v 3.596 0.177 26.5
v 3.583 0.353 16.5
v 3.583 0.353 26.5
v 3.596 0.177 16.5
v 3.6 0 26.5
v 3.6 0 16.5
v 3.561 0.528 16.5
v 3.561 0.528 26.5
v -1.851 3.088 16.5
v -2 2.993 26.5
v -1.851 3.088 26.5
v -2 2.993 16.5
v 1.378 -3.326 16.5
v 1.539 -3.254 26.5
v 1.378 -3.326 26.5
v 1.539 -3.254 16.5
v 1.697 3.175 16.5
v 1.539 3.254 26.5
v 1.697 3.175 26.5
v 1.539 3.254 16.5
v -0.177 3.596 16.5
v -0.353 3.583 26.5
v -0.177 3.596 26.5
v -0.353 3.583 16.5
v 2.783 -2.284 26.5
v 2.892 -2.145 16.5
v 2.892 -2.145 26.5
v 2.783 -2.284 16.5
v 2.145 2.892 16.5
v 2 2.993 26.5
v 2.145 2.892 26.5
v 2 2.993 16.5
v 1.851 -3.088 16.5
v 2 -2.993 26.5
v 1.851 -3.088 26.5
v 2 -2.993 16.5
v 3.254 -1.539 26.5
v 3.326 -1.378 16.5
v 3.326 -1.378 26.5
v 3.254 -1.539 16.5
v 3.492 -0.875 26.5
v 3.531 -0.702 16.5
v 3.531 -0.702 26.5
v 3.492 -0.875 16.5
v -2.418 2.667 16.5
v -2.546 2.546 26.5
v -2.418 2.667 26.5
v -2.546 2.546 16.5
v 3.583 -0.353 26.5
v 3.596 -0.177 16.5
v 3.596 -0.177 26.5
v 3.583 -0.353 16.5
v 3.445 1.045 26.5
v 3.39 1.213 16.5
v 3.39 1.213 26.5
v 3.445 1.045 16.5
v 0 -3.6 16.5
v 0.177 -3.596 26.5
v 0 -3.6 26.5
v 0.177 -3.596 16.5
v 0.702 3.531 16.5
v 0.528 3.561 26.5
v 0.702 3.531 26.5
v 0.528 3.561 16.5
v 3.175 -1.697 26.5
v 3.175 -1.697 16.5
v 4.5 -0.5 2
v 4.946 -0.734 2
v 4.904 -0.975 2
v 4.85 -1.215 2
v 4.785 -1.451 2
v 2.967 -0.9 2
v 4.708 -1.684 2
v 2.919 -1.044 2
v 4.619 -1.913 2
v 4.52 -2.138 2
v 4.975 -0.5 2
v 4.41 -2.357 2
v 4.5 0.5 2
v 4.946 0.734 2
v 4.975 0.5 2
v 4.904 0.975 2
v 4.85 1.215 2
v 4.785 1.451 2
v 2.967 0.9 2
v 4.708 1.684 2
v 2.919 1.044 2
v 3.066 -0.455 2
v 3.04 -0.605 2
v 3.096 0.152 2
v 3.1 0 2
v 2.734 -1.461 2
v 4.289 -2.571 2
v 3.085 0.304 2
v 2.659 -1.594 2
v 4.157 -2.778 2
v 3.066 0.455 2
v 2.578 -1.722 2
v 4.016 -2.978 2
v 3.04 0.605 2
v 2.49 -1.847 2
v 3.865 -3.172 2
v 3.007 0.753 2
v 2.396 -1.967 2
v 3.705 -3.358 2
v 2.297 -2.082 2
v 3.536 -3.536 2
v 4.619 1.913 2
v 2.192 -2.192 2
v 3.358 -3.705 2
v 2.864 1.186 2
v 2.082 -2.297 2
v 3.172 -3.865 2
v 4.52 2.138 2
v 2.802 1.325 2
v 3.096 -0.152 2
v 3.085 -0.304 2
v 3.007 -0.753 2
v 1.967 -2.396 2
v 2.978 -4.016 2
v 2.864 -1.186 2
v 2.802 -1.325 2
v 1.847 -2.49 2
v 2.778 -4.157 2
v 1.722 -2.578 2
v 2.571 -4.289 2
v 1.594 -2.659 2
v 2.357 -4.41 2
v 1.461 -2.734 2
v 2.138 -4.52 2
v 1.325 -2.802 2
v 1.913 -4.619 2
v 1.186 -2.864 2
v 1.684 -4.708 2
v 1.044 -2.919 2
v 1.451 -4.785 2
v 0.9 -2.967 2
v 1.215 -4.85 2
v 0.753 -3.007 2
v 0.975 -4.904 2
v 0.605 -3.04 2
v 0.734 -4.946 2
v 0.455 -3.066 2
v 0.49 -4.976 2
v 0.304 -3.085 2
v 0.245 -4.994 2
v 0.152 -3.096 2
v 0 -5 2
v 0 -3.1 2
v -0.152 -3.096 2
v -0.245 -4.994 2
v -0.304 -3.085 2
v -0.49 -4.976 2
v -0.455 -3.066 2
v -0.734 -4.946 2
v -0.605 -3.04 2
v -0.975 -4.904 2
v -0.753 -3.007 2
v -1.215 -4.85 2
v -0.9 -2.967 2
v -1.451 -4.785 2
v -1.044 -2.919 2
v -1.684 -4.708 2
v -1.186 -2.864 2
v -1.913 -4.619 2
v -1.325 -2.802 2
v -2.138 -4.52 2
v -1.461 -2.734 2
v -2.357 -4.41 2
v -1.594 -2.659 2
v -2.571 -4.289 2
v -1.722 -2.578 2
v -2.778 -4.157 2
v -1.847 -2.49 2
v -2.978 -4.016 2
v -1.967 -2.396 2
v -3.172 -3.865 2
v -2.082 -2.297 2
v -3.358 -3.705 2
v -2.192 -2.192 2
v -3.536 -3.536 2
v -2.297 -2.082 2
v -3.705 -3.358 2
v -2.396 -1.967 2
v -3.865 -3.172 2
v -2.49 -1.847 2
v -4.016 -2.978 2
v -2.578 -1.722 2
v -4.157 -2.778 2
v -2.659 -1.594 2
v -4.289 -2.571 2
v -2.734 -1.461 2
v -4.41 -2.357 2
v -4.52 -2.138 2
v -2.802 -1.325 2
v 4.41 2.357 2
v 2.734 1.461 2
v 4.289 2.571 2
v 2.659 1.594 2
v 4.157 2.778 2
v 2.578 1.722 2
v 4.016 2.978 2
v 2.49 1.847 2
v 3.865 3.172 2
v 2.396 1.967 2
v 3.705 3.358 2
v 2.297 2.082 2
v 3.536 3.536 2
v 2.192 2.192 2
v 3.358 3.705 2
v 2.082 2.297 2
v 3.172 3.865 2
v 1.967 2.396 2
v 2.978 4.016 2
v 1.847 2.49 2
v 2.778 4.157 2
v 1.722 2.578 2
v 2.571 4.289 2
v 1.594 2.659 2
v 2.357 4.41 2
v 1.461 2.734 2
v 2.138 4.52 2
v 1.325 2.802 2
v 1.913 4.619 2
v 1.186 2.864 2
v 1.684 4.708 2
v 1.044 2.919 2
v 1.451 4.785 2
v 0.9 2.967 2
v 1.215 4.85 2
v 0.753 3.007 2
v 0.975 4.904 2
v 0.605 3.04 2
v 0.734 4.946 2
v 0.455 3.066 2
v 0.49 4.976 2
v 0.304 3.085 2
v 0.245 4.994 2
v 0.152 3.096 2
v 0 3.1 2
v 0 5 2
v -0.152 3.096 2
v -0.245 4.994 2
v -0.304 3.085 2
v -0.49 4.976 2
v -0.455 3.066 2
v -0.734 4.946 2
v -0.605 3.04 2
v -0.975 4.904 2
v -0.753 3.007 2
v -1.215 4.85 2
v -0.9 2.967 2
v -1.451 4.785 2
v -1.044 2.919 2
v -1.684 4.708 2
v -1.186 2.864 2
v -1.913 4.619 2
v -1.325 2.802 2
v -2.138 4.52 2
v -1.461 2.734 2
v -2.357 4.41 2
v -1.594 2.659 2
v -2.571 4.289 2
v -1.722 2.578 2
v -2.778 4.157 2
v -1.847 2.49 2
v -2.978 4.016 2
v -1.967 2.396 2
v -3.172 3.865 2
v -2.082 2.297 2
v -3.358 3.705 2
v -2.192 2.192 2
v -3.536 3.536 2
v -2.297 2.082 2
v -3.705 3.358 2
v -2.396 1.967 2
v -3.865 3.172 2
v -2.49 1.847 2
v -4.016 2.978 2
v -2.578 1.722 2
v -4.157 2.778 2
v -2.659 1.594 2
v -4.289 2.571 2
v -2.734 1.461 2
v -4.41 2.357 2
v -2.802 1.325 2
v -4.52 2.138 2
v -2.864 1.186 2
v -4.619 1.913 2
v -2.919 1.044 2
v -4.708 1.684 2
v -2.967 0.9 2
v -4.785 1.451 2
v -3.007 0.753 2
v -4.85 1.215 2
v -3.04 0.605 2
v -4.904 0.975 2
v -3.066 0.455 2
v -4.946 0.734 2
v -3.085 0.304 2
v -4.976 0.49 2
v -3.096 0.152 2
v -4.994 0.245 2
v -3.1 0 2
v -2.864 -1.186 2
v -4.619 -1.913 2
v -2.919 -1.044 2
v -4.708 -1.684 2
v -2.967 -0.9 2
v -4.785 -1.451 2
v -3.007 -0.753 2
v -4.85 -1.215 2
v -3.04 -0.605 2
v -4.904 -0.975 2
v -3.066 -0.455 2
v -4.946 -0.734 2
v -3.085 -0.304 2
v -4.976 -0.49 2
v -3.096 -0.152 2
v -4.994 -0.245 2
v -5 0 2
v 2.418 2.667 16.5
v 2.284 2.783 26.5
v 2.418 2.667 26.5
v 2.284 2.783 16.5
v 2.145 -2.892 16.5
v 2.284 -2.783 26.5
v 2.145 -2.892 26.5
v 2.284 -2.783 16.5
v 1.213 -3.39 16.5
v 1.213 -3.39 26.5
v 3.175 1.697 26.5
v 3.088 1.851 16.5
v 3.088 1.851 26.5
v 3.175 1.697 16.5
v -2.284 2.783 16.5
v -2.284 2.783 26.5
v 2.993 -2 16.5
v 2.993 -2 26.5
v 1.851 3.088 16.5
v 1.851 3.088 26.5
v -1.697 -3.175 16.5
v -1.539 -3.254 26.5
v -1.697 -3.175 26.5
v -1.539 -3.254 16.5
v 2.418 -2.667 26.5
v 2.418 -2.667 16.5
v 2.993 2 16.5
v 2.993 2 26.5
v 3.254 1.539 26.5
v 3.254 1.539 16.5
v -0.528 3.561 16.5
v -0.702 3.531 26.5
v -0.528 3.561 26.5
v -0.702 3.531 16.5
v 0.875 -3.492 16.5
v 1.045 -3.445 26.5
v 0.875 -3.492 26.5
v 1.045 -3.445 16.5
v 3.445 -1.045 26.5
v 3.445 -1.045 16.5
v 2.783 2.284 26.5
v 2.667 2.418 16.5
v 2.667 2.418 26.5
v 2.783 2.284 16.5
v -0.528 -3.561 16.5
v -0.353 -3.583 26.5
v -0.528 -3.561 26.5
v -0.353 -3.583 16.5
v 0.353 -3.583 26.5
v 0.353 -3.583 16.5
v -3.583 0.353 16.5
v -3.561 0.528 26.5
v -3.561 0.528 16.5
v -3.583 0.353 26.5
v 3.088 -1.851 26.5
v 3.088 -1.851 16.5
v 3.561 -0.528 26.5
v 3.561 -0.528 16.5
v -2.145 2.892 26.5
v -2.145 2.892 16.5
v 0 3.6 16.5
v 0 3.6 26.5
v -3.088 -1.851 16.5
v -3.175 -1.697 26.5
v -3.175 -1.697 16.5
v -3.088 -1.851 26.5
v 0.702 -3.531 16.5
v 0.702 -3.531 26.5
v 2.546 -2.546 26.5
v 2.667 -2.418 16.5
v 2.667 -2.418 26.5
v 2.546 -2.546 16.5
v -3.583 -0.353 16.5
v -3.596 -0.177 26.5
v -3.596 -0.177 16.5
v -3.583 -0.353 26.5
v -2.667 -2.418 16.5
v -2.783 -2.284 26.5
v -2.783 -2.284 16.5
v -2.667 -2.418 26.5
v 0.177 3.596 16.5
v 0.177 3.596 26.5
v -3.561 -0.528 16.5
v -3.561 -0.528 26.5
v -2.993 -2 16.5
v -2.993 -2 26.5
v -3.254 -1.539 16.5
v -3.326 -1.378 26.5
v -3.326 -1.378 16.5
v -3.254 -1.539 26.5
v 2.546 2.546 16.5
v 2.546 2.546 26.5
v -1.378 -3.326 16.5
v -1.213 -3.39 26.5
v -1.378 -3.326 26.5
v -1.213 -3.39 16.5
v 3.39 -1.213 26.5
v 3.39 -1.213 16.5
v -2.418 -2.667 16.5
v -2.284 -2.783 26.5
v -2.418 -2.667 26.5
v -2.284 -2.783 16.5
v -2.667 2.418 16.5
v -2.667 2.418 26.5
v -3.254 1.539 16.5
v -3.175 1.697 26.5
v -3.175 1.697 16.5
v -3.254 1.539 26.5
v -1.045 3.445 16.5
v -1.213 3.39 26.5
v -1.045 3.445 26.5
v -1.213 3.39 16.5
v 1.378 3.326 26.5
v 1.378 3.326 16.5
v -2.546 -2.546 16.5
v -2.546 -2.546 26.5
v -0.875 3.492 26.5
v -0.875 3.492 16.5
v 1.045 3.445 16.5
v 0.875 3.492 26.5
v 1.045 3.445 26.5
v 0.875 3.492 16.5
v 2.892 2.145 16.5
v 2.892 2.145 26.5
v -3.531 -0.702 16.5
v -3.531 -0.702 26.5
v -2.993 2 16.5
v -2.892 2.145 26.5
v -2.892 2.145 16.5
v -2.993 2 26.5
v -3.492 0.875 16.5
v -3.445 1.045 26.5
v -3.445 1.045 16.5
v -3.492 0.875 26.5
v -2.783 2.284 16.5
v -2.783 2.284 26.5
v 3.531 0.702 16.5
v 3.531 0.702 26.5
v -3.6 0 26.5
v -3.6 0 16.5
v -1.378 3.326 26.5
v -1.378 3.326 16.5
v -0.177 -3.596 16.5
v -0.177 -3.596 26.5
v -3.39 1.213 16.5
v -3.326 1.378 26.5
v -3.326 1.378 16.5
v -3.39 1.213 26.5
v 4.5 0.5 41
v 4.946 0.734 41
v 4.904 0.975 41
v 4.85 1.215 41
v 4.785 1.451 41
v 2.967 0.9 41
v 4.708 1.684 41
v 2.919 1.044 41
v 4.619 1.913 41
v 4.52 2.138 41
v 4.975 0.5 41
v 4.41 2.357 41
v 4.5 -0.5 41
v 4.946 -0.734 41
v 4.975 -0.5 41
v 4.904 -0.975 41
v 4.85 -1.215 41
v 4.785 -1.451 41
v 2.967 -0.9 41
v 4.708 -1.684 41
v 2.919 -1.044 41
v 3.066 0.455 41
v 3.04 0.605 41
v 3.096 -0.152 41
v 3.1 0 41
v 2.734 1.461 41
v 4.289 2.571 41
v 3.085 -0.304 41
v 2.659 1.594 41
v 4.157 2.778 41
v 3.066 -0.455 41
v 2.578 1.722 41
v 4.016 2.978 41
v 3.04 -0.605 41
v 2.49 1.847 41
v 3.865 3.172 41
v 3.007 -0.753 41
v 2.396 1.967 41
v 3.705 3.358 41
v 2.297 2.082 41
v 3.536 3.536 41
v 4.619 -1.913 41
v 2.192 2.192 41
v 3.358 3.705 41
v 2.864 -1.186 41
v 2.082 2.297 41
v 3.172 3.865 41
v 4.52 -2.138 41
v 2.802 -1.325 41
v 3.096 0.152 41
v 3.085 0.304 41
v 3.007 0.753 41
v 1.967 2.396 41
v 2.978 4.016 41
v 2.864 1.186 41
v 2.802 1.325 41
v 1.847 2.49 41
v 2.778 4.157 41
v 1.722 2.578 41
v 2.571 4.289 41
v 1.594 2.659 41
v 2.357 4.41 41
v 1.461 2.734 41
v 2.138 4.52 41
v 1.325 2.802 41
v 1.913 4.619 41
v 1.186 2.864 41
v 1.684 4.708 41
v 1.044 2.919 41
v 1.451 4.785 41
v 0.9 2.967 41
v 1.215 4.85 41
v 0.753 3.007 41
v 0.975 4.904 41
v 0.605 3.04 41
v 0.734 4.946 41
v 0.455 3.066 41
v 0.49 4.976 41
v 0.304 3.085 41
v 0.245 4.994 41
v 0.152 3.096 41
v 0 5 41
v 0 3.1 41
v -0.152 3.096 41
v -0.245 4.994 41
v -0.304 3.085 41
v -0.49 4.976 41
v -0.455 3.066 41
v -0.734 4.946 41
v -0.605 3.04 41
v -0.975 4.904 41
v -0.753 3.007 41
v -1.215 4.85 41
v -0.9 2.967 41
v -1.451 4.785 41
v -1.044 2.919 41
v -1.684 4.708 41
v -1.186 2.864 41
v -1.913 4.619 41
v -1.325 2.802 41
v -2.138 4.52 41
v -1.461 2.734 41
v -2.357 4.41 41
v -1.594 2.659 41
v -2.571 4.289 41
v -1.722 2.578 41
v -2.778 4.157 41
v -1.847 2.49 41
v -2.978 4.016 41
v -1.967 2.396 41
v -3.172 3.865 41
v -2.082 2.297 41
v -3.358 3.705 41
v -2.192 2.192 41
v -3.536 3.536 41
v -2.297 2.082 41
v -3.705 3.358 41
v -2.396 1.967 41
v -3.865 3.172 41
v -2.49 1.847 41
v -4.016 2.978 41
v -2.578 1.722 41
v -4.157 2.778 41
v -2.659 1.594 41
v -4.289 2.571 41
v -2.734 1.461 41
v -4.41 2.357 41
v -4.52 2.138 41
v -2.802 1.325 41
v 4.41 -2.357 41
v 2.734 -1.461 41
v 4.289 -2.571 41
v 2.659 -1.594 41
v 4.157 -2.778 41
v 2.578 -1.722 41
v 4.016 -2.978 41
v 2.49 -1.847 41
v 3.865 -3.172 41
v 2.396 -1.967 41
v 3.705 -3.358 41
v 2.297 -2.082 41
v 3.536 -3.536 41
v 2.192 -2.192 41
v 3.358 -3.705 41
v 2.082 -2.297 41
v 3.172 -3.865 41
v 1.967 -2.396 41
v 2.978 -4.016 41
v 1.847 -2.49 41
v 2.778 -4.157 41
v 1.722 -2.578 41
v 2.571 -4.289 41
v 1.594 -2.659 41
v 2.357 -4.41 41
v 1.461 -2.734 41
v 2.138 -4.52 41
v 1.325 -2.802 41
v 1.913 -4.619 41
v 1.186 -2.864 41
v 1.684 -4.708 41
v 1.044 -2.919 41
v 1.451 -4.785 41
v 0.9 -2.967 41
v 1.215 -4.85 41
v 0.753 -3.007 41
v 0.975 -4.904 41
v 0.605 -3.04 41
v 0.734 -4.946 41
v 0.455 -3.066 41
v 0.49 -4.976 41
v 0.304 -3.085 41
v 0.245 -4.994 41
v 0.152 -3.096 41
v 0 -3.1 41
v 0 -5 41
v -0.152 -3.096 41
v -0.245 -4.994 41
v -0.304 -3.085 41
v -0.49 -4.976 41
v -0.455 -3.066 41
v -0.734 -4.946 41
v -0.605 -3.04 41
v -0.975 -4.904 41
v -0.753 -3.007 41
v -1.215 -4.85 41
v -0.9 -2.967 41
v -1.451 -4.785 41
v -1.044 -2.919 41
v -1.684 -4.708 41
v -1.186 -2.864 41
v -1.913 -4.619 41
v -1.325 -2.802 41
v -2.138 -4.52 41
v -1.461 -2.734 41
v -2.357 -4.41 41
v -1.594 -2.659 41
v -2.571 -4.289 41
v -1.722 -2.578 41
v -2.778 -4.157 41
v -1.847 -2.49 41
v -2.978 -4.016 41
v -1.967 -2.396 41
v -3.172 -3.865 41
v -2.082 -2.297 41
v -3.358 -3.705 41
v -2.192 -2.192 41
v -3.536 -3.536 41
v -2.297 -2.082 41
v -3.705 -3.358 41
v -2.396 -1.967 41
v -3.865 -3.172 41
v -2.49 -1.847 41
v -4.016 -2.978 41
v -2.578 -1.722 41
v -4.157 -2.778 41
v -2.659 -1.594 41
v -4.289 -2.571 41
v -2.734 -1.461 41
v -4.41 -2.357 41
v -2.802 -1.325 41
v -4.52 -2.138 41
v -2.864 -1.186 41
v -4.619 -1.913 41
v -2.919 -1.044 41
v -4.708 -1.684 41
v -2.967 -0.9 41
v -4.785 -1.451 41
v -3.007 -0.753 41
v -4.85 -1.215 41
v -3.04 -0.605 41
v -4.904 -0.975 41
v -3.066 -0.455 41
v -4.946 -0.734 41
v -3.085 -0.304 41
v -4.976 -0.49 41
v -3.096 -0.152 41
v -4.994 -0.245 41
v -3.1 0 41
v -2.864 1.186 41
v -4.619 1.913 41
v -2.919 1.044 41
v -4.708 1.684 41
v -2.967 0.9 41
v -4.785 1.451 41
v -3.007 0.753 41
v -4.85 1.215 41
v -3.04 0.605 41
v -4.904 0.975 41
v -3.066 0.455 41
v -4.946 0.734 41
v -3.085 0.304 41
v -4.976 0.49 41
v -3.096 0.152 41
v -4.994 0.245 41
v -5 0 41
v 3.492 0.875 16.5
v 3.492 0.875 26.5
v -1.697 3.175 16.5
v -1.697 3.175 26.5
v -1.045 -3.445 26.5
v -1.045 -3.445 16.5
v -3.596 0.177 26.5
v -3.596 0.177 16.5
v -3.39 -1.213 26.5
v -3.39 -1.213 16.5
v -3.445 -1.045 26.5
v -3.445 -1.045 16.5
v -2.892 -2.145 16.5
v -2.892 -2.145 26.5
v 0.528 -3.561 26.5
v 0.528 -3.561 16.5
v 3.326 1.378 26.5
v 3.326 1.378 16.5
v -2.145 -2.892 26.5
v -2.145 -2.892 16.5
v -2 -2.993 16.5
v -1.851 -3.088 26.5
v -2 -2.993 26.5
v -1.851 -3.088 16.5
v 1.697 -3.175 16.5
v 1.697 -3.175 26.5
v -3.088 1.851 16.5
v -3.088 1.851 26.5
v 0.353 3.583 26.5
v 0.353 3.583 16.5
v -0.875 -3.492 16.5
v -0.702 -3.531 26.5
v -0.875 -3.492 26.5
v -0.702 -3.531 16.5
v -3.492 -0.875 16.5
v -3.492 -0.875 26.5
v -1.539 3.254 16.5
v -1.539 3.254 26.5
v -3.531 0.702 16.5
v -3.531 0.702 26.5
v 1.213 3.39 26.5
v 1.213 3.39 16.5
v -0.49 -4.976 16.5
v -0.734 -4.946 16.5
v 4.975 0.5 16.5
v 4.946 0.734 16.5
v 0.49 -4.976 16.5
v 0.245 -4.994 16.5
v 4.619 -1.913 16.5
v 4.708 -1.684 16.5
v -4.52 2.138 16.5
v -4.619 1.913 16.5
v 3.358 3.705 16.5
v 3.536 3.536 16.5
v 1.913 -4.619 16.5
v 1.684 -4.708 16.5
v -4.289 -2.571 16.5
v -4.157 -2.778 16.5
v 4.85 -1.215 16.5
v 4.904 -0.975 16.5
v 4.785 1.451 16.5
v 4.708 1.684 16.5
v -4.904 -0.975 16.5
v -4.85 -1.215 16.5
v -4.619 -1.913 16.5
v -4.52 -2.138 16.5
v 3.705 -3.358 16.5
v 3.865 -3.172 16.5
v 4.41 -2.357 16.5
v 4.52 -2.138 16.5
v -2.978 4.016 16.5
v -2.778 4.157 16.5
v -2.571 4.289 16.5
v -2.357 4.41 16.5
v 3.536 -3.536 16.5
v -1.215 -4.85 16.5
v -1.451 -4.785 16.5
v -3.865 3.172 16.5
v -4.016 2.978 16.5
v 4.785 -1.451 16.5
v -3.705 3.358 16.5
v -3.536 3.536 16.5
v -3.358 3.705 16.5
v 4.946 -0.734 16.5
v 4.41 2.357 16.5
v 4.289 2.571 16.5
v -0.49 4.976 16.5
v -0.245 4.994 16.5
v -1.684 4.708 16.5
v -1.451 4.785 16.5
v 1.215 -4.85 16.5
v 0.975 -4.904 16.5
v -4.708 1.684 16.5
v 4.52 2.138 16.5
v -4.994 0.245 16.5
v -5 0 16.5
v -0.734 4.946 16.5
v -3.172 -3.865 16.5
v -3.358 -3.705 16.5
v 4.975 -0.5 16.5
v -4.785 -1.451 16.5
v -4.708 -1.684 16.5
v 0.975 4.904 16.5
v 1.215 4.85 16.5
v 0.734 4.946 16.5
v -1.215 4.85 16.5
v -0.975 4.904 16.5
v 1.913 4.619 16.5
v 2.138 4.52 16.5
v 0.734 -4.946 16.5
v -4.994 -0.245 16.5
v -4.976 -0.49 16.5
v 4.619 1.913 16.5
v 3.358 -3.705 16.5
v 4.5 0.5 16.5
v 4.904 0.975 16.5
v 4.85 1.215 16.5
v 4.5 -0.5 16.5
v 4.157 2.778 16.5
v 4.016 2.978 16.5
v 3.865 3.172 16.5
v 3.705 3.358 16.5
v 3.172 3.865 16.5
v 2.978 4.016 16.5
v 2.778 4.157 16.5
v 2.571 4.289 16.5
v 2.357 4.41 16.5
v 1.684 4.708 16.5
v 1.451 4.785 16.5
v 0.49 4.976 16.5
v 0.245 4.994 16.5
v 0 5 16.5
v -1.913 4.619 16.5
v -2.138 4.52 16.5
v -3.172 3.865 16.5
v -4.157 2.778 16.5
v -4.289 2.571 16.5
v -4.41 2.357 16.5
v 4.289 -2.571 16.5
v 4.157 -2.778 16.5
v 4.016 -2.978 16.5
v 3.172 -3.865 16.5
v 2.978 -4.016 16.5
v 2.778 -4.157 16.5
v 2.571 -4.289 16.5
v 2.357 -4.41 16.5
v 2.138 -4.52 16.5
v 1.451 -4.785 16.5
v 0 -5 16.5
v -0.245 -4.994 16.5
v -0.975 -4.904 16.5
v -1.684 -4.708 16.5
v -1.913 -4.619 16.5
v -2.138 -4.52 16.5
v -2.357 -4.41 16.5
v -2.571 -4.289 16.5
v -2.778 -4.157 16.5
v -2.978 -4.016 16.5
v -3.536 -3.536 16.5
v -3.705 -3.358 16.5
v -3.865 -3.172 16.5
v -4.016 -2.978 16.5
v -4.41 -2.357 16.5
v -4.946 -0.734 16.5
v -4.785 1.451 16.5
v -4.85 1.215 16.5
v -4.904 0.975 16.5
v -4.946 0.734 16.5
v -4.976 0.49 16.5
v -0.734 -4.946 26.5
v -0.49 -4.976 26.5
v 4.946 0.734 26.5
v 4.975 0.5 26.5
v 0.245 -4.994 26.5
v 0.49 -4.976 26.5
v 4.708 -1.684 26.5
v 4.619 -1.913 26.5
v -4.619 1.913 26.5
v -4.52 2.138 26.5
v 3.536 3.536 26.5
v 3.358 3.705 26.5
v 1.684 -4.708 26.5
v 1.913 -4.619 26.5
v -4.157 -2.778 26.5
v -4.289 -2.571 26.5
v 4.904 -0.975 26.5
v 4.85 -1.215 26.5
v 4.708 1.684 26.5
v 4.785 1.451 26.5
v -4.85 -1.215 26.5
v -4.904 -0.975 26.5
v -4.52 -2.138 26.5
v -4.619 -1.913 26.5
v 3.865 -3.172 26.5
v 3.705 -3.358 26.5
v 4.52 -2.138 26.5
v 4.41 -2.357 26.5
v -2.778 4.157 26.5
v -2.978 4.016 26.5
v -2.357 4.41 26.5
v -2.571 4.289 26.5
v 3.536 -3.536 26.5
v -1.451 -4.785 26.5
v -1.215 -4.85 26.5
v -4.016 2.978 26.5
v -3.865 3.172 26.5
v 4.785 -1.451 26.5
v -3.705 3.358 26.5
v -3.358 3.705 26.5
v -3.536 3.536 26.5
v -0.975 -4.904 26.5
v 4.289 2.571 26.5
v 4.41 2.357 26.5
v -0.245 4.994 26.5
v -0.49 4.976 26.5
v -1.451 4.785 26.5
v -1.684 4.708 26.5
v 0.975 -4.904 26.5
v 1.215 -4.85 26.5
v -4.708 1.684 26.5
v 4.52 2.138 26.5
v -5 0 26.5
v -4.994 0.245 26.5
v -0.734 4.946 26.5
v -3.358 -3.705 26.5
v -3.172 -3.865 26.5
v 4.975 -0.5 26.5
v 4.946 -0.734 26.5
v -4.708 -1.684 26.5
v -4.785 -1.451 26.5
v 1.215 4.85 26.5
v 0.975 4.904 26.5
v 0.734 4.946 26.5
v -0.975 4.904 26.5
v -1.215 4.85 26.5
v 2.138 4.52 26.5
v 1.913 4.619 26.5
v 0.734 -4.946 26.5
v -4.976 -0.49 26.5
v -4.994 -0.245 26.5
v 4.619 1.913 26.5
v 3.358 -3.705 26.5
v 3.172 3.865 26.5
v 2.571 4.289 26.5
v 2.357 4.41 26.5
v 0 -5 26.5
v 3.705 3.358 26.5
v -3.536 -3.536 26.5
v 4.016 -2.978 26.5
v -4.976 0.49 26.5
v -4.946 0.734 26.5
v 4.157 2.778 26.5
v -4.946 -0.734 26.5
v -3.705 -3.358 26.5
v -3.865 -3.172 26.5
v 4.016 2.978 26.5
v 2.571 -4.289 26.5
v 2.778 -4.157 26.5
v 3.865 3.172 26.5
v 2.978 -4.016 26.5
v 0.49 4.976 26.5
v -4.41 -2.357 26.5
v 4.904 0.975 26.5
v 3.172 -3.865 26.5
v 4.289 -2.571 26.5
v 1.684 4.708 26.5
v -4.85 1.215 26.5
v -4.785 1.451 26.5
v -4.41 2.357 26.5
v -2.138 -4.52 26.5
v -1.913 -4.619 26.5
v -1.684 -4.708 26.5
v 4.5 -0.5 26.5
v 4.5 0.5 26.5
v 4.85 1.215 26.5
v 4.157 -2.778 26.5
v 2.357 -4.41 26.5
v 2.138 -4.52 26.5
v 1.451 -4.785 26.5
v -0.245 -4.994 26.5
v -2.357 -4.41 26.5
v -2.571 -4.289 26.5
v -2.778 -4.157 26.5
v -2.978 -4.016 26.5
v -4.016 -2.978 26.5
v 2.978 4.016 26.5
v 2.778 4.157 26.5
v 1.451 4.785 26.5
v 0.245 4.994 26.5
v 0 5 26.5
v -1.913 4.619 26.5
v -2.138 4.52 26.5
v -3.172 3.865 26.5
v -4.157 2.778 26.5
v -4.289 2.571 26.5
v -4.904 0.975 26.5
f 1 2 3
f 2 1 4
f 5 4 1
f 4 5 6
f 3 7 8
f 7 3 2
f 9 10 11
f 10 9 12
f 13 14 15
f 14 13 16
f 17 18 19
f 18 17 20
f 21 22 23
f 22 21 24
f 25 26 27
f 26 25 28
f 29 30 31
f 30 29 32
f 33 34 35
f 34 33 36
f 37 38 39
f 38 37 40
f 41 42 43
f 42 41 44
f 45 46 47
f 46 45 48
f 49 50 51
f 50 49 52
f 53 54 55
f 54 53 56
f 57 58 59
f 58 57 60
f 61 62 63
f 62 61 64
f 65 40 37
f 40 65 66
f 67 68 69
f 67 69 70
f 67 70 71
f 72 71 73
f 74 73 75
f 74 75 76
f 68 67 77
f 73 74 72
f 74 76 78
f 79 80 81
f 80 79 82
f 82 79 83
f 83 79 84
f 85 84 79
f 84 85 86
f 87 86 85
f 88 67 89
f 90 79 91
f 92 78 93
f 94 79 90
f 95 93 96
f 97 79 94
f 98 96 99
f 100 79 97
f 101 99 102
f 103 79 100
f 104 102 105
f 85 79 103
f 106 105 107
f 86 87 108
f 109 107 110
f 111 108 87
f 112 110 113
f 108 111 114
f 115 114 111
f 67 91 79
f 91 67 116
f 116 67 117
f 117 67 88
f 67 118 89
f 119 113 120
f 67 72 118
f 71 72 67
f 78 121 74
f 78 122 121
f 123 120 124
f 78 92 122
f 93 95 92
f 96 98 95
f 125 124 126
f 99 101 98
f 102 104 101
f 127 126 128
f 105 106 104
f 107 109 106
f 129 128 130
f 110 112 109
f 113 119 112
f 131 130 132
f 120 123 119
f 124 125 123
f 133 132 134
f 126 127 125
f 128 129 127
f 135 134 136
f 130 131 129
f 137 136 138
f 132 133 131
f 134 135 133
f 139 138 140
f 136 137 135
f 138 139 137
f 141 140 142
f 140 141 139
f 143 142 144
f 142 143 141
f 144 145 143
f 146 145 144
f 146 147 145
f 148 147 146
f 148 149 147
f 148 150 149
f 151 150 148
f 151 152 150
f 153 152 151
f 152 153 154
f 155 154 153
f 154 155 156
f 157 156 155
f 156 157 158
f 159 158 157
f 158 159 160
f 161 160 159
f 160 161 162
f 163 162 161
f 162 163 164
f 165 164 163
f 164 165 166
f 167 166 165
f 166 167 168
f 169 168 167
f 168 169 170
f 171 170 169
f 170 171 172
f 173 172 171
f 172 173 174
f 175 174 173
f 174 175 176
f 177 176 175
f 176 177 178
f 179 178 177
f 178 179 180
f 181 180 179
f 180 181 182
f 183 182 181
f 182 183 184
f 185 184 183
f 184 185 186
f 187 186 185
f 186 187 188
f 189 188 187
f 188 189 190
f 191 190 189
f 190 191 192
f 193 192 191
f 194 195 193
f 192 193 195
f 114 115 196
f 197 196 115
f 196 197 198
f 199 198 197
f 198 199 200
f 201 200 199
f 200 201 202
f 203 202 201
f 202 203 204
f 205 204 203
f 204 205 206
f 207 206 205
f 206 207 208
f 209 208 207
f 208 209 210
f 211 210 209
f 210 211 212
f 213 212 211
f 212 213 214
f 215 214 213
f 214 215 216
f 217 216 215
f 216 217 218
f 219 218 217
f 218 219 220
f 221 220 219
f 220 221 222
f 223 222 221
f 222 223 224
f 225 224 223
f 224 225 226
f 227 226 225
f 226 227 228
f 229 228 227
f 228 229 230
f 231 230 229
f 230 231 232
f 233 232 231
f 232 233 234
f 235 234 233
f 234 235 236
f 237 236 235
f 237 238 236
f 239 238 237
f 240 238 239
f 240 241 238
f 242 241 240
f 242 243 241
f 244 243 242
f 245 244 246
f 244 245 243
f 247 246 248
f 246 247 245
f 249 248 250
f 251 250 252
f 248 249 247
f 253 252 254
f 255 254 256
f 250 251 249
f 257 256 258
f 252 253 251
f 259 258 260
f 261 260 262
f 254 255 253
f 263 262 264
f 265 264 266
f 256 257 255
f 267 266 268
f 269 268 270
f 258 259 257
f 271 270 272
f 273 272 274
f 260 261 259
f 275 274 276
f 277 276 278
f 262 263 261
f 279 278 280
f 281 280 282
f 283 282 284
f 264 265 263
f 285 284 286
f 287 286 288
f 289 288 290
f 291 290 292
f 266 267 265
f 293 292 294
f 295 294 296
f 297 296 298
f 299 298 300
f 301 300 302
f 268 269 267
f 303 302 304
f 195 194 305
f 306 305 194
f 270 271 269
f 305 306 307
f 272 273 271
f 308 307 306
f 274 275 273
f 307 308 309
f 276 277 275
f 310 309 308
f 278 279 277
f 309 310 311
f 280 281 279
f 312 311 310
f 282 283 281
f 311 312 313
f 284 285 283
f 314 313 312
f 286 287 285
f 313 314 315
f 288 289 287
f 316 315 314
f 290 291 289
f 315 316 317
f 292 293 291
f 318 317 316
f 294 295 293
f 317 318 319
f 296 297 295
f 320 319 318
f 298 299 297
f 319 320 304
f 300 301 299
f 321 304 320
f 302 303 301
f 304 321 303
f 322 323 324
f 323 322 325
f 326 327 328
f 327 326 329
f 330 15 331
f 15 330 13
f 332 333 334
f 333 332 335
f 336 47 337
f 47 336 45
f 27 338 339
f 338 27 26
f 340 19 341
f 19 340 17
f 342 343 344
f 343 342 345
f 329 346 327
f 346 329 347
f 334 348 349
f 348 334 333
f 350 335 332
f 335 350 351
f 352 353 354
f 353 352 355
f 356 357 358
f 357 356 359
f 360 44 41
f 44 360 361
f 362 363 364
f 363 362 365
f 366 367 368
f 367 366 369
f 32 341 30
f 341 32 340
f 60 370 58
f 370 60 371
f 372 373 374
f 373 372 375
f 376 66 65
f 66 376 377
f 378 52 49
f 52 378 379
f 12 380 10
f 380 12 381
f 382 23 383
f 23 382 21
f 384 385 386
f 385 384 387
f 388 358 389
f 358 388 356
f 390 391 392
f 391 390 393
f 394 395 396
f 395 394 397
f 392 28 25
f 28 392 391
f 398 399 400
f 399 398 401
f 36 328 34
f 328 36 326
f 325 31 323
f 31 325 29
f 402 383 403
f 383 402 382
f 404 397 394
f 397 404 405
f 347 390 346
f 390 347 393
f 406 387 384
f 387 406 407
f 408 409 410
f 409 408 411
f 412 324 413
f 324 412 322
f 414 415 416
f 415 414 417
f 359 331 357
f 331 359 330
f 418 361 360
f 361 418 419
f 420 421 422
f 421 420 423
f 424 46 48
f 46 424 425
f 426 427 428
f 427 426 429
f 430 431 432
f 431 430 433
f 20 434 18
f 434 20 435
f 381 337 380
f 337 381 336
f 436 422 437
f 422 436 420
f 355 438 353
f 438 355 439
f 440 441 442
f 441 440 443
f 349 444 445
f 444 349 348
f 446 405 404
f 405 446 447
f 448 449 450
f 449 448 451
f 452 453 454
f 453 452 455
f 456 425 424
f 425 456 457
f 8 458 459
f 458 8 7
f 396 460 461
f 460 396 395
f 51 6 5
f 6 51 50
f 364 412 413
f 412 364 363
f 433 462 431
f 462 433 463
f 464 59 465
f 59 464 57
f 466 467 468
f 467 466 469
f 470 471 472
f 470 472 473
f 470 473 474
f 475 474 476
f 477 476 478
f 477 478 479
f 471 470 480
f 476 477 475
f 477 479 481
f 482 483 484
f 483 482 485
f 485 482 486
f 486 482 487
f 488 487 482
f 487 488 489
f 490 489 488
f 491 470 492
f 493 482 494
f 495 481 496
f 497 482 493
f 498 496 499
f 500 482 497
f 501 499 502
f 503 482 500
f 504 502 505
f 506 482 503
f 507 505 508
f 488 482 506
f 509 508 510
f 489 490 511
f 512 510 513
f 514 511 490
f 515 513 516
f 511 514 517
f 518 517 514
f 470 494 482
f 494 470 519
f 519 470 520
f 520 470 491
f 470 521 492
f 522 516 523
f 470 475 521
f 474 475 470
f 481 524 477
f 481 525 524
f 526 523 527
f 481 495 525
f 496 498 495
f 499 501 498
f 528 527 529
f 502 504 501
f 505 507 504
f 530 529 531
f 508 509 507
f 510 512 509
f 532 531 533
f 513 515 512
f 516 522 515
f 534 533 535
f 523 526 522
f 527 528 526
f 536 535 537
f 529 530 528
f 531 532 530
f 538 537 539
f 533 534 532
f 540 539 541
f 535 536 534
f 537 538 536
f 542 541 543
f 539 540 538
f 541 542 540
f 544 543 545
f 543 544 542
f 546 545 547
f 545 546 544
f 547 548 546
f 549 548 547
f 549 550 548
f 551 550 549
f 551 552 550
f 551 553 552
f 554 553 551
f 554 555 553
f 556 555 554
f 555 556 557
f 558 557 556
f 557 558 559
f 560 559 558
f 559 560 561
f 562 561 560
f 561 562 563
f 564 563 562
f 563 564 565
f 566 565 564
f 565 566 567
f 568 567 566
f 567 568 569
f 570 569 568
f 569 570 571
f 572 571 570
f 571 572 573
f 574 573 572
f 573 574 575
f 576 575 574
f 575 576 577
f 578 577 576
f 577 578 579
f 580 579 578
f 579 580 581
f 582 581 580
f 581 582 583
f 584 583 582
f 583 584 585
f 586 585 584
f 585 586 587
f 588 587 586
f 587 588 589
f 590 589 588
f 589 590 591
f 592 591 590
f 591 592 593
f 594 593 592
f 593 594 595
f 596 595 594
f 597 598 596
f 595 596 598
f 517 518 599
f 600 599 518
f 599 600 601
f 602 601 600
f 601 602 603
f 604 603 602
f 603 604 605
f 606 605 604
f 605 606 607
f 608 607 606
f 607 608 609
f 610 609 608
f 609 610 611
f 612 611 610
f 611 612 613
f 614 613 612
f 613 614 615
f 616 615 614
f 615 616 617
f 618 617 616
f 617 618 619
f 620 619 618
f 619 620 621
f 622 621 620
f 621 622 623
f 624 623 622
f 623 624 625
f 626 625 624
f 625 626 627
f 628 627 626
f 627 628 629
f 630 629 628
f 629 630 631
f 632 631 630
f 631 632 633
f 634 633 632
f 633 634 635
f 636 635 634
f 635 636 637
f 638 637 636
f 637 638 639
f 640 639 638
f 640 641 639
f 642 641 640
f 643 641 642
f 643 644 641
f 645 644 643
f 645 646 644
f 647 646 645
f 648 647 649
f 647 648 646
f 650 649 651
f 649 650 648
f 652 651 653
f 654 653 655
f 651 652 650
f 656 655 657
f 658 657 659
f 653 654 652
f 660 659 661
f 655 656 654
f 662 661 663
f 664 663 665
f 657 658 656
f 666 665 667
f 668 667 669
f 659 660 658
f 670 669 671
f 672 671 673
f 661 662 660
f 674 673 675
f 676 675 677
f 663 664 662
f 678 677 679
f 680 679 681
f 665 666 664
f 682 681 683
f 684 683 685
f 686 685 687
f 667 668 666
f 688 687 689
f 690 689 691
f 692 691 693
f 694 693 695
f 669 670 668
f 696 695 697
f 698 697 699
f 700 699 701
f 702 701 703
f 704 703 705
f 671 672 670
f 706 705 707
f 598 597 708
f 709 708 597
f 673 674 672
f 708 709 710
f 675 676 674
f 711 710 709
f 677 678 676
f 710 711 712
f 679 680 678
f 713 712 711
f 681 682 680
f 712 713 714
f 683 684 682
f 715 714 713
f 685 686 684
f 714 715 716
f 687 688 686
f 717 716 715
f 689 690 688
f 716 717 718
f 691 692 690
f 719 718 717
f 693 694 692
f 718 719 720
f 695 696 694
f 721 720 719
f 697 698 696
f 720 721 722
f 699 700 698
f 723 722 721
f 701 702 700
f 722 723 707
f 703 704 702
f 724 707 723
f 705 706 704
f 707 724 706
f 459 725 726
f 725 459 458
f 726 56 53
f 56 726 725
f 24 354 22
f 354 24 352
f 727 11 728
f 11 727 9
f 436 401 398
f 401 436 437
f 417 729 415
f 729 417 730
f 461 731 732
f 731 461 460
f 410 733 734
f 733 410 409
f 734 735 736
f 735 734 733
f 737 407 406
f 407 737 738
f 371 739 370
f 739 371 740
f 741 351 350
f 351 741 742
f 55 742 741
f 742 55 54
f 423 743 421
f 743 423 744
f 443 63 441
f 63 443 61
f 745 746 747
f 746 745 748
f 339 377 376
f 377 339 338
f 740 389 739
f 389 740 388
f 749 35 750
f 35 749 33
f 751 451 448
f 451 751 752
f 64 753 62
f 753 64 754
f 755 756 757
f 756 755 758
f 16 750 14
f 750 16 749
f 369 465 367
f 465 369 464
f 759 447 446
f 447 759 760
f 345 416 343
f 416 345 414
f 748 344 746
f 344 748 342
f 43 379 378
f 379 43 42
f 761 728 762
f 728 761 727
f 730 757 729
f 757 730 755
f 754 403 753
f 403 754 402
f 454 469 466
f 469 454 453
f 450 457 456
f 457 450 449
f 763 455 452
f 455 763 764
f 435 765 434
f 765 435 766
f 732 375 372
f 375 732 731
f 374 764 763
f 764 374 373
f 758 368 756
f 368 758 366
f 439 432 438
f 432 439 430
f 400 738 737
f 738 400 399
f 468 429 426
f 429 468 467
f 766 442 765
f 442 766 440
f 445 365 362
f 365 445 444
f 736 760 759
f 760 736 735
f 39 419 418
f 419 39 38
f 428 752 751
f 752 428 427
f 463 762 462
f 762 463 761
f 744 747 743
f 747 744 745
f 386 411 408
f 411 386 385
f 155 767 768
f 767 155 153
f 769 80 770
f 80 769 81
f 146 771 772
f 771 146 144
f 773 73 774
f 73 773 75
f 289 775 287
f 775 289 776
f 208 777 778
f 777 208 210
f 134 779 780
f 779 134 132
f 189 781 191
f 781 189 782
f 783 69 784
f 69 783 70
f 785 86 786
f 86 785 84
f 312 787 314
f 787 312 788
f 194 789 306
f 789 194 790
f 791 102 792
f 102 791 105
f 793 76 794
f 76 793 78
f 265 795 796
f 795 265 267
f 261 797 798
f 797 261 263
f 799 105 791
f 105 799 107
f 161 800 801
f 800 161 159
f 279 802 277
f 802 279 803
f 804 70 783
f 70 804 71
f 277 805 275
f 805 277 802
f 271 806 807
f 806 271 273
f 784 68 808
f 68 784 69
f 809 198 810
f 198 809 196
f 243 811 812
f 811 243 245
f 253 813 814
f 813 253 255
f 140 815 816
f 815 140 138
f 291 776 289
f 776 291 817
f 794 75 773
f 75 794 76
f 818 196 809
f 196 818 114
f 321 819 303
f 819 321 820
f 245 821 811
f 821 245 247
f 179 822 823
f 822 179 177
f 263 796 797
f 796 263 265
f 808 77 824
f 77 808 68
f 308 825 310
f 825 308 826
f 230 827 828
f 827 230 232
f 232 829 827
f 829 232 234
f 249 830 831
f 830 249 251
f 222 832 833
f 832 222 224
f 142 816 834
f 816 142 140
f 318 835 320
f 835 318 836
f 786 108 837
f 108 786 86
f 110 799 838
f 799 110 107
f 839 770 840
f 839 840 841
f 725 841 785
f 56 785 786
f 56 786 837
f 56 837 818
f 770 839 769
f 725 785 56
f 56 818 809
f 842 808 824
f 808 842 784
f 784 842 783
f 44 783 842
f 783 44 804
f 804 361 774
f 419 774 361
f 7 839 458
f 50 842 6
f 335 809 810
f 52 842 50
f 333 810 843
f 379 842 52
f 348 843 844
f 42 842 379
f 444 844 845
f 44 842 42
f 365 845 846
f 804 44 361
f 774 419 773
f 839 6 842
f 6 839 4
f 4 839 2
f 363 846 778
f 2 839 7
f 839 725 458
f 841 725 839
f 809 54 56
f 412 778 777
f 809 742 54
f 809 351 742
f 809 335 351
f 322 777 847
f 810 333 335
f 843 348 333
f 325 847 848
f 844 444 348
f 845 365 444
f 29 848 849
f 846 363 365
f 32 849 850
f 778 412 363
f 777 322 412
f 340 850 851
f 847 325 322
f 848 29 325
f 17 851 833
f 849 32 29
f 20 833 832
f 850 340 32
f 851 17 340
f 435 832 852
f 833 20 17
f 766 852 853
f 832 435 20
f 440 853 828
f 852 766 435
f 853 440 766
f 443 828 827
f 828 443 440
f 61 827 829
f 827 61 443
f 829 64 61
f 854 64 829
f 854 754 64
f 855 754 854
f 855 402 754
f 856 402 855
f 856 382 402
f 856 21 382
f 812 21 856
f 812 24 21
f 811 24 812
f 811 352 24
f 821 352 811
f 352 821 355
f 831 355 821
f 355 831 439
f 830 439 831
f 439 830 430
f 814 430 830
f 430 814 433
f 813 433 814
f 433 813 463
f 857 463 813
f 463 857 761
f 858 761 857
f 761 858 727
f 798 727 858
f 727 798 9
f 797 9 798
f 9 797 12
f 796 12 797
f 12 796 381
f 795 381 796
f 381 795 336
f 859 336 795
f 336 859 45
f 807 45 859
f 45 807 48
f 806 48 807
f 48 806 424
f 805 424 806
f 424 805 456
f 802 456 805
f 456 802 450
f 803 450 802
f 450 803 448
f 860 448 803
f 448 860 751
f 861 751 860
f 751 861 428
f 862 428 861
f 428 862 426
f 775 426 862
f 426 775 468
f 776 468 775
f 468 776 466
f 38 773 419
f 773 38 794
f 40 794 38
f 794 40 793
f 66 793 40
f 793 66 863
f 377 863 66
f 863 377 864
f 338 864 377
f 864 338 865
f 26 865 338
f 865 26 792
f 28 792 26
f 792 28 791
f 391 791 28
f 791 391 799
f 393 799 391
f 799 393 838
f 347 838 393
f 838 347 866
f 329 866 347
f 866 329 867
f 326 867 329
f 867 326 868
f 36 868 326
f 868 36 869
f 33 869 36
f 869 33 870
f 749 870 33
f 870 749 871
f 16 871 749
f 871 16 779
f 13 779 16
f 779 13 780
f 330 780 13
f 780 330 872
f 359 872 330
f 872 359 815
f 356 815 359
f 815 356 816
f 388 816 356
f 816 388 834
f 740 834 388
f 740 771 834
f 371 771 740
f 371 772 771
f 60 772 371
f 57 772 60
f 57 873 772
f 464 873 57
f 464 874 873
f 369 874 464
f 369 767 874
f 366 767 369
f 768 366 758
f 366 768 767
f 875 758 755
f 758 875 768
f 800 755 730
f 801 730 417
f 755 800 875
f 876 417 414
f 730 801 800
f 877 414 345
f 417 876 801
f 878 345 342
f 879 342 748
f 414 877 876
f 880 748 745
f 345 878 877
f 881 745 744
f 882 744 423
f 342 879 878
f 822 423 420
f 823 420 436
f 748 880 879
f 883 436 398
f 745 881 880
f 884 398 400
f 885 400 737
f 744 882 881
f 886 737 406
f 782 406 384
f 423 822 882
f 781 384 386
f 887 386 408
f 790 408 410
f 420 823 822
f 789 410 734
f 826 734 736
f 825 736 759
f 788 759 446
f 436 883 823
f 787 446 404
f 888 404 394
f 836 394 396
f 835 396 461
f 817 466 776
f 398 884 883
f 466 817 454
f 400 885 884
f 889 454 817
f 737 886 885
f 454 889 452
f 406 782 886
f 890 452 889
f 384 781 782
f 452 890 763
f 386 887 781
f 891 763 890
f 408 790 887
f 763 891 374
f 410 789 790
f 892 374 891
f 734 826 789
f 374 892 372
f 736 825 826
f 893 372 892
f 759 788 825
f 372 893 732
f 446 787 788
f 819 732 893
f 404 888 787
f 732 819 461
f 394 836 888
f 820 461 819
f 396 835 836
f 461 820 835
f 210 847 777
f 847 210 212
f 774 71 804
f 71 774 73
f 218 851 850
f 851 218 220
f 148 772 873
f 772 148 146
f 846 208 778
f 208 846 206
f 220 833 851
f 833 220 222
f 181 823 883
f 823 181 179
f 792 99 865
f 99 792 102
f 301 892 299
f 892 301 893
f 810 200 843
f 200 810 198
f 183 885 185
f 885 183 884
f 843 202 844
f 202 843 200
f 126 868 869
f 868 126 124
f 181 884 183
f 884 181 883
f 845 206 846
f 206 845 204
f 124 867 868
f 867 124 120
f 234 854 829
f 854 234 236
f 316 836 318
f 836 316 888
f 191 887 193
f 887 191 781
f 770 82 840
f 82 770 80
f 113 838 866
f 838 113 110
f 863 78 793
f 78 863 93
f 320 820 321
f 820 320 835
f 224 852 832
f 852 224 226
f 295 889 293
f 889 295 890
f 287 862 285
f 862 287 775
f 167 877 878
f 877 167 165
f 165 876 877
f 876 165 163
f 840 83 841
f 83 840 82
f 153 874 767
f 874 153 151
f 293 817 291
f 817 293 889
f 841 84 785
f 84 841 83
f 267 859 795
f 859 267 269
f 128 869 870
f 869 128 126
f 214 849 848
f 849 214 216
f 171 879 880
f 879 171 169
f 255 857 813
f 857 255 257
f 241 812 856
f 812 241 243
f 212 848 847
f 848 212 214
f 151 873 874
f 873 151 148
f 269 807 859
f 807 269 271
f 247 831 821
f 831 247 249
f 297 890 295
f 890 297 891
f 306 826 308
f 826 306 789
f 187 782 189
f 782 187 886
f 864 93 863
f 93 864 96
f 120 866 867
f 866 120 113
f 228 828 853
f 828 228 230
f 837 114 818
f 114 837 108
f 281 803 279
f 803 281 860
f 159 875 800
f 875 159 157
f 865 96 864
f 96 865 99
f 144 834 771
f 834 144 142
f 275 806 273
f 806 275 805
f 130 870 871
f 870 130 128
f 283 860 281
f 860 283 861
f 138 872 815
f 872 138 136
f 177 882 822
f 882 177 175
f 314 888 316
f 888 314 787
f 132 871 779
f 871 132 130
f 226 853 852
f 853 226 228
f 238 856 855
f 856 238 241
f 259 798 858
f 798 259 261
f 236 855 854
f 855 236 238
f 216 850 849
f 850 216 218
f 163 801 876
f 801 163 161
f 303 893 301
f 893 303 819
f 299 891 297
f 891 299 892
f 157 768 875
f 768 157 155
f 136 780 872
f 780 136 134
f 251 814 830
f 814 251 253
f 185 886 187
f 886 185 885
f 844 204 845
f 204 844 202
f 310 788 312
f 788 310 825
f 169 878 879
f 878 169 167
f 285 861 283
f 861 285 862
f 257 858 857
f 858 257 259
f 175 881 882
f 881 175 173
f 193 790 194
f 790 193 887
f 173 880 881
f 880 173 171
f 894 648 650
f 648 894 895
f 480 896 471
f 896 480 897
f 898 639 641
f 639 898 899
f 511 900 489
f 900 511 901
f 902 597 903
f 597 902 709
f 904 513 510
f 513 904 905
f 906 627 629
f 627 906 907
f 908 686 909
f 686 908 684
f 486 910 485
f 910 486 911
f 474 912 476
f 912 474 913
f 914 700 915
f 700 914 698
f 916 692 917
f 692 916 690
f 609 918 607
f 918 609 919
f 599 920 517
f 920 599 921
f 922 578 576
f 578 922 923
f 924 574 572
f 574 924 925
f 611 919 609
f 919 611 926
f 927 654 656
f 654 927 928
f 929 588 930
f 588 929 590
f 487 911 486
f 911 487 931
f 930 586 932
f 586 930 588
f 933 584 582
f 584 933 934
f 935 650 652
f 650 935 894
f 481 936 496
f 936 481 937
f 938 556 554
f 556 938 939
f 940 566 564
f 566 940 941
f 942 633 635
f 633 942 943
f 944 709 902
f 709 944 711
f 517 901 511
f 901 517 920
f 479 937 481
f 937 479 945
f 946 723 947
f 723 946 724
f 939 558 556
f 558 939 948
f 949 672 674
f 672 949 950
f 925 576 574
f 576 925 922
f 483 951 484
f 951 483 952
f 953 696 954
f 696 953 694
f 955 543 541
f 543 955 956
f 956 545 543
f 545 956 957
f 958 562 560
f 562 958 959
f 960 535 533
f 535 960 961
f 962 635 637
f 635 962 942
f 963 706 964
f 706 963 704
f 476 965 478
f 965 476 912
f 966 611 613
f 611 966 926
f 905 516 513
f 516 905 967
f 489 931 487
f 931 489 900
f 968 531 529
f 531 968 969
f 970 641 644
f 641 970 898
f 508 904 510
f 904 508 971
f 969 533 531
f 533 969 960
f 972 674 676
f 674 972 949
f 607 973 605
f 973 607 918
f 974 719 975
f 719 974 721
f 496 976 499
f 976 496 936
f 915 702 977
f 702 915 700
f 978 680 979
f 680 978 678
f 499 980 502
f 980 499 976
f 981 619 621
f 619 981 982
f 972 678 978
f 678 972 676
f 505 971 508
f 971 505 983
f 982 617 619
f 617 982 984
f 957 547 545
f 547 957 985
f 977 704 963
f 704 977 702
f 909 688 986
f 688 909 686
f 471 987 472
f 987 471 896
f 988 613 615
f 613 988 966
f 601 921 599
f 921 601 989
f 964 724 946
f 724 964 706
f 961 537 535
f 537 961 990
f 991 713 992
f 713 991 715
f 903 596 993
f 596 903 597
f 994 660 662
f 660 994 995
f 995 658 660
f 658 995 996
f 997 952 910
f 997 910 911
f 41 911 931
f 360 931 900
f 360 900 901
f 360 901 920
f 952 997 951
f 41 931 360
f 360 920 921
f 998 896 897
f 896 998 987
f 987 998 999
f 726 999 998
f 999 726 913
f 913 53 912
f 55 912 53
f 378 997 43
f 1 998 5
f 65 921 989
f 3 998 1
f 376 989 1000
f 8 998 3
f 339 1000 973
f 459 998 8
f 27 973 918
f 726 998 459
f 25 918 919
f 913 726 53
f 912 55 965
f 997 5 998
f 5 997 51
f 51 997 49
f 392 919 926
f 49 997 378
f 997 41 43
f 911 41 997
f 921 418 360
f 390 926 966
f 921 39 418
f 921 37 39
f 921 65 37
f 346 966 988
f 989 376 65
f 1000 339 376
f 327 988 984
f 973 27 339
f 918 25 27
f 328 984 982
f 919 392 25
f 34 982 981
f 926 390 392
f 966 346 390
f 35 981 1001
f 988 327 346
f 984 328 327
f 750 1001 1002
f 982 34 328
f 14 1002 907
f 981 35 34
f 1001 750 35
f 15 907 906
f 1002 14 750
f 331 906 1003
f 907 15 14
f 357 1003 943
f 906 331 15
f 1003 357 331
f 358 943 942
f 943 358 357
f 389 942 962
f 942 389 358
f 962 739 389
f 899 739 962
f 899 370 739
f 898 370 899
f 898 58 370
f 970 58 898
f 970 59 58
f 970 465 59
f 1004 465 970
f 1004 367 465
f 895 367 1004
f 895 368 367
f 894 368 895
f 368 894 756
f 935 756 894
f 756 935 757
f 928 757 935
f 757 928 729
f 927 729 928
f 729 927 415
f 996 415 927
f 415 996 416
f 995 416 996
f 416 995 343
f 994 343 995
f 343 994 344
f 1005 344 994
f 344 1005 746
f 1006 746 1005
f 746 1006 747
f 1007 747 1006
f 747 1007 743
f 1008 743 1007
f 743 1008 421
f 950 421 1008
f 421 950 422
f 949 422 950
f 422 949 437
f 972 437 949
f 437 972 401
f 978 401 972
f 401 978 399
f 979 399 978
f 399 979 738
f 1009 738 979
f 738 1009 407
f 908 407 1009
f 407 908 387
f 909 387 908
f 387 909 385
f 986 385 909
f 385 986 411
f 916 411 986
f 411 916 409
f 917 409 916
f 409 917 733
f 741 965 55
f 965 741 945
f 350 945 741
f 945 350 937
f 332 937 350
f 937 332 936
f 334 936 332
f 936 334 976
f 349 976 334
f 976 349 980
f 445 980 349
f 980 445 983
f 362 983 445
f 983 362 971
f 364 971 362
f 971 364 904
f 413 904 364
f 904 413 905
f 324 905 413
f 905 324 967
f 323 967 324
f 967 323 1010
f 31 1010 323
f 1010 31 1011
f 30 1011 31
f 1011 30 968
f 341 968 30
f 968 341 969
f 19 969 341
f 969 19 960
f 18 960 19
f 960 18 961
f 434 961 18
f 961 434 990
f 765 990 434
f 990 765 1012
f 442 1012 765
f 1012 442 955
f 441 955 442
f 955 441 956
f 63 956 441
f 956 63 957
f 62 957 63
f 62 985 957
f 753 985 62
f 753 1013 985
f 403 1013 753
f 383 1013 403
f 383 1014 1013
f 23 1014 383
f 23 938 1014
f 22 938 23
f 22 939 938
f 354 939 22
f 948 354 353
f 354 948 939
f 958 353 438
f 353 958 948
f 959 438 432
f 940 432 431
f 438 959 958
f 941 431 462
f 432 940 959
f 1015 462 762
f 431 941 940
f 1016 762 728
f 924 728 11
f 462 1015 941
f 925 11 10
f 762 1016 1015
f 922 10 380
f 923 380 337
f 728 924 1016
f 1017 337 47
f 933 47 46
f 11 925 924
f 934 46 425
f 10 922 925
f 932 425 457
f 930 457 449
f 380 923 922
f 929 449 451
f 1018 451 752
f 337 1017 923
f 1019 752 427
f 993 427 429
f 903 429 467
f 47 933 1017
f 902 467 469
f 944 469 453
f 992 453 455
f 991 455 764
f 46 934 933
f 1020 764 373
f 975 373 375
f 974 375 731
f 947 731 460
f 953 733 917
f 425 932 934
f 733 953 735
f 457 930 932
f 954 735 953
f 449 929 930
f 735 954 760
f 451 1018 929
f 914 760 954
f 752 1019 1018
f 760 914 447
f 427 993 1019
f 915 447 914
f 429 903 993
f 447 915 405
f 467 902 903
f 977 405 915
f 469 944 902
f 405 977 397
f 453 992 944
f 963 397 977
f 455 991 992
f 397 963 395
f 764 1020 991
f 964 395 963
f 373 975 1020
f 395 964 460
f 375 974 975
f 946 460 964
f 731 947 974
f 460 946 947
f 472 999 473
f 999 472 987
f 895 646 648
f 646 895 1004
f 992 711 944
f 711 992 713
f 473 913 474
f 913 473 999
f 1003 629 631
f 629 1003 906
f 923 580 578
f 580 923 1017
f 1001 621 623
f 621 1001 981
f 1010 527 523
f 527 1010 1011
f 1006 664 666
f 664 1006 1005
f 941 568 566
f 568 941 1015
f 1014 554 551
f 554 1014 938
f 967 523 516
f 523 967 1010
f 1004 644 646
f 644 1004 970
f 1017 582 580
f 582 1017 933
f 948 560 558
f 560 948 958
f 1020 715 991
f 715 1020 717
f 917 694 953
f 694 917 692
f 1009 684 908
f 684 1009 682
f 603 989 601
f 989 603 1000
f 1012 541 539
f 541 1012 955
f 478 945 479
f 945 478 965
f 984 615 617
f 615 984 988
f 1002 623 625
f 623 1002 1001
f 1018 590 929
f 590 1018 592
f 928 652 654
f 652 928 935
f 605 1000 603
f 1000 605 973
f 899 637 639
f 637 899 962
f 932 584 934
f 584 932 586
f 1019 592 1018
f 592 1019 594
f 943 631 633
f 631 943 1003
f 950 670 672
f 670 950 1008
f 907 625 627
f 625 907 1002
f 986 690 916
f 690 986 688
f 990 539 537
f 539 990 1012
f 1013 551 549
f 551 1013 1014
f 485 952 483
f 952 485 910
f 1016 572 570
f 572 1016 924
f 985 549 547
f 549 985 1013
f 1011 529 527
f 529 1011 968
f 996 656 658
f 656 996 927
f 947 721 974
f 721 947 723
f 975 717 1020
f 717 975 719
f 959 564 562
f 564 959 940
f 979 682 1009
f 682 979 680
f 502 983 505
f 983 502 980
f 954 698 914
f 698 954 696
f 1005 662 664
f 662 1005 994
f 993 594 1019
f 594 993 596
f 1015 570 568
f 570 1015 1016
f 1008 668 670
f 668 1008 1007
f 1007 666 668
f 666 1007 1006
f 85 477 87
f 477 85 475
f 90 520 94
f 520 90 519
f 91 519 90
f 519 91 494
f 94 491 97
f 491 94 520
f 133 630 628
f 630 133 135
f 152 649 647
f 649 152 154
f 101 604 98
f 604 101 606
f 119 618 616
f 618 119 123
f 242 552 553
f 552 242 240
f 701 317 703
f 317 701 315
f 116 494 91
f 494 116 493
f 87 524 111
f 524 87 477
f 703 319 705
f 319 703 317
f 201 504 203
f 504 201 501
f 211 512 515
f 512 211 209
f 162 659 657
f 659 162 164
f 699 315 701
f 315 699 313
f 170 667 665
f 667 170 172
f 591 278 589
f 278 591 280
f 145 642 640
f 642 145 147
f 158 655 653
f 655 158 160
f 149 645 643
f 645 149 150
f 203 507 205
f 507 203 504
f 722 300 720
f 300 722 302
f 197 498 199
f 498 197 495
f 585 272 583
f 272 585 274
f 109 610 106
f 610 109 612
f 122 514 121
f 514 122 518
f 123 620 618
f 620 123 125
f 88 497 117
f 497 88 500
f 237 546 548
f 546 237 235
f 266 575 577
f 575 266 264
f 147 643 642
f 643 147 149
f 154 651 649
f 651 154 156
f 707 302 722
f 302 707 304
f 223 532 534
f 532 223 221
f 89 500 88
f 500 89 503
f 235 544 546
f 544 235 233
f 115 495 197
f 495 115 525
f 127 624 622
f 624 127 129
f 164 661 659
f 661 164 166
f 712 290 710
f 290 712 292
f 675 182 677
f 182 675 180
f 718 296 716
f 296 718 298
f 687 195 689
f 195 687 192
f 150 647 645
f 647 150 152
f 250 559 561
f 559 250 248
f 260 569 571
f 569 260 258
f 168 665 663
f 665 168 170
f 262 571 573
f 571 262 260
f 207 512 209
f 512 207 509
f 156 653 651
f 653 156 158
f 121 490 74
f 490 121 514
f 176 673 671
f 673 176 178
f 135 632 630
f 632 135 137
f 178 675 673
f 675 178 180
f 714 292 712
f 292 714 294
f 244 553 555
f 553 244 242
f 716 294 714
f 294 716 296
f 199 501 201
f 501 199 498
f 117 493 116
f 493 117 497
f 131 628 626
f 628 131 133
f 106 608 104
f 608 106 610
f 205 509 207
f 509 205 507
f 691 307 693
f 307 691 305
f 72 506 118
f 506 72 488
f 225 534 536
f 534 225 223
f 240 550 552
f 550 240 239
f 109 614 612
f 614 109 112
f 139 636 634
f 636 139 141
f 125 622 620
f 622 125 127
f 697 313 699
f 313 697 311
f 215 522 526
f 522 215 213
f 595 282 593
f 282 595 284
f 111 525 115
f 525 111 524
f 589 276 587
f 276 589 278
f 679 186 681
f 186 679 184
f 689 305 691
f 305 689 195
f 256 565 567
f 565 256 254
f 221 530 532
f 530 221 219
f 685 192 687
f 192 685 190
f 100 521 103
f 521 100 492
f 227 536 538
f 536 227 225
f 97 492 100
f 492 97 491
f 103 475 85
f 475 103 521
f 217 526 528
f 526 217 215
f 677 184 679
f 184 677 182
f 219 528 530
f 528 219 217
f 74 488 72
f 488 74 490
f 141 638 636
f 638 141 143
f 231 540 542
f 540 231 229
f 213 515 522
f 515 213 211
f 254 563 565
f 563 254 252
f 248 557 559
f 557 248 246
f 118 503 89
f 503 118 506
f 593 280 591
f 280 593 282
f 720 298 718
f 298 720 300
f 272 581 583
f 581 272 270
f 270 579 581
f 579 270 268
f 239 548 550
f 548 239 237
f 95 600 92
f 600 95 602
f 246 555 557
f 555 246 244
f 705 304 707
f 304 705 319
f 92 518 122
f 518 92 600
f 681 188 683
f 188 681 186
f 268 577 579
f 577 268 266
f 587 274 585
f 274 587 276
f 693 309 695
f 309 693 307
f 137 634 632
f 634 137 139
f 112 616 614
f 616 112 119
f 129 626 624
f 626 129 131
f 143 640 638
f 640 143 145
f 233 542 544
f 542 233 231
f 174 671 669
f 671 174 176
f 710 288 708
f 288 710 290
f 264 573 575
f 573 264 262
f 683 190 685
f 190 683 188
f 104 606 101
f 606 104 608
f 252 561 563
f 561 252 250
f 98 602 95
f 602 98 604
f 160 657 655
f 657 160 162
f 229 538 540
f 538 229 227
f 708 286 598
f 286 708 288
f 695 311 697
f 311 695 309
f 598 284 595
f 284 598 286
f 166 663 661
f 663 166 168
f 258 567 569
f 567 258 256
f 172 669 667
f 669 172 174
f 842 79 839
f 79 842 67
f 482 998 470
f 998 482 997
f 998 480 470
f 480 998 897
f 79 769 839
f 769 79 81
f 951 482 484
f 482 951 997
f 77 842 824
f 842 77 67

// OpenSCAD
/**
 * Martin Egli
 * 2021-11-12
 */

module aaaBattery(loc_res = 32) {
    translate([0, 0, 0])
    cylinder(d = 10.5, h = 43, $fn = loc_res);
    translate([0, 0, 43])
    cylinder(d = 4, h = 1, $fn = loc_res);
}

module magnetS0608N(loc_res = 32) {
    color("Silver")
    translate([0, 0, 0])
    cylinder(d = 6, h = 8, $fn = loc_res);
}

module ehPartA(loc_res = 32) {
    difference() {
        union() {
            translate([0, 0, 2])
            cylinder(d = 6.2+1, h = 43-4, $fn = loc_res);
            translate([0, 0, 2])
            cylinder(d = 10, h = (43-10)/2-2, $fn = loc_res);
            translate([0, 0, 2+(43-10)/2+10-2])
            cylinder(d = 10, h = (43-10)/2-2, $fn = loc_res);
        }
        translate([0, 0, -1])
        cylinder(d = 6.2, h = 45, $fn = loc_res);
        translate([10/2-0.5, -0.5, -1])
        cube([1, 1, 45]);
    }
}

module ehPartB(loc_res = 32) {
    translate([0, 0, 0])
    cylinder(d = 10, h = 2, $fn = loc_res);
}
//aaaBattery();
//magnetS0608N();
ehPartA(128);
//ehPartB(128);
